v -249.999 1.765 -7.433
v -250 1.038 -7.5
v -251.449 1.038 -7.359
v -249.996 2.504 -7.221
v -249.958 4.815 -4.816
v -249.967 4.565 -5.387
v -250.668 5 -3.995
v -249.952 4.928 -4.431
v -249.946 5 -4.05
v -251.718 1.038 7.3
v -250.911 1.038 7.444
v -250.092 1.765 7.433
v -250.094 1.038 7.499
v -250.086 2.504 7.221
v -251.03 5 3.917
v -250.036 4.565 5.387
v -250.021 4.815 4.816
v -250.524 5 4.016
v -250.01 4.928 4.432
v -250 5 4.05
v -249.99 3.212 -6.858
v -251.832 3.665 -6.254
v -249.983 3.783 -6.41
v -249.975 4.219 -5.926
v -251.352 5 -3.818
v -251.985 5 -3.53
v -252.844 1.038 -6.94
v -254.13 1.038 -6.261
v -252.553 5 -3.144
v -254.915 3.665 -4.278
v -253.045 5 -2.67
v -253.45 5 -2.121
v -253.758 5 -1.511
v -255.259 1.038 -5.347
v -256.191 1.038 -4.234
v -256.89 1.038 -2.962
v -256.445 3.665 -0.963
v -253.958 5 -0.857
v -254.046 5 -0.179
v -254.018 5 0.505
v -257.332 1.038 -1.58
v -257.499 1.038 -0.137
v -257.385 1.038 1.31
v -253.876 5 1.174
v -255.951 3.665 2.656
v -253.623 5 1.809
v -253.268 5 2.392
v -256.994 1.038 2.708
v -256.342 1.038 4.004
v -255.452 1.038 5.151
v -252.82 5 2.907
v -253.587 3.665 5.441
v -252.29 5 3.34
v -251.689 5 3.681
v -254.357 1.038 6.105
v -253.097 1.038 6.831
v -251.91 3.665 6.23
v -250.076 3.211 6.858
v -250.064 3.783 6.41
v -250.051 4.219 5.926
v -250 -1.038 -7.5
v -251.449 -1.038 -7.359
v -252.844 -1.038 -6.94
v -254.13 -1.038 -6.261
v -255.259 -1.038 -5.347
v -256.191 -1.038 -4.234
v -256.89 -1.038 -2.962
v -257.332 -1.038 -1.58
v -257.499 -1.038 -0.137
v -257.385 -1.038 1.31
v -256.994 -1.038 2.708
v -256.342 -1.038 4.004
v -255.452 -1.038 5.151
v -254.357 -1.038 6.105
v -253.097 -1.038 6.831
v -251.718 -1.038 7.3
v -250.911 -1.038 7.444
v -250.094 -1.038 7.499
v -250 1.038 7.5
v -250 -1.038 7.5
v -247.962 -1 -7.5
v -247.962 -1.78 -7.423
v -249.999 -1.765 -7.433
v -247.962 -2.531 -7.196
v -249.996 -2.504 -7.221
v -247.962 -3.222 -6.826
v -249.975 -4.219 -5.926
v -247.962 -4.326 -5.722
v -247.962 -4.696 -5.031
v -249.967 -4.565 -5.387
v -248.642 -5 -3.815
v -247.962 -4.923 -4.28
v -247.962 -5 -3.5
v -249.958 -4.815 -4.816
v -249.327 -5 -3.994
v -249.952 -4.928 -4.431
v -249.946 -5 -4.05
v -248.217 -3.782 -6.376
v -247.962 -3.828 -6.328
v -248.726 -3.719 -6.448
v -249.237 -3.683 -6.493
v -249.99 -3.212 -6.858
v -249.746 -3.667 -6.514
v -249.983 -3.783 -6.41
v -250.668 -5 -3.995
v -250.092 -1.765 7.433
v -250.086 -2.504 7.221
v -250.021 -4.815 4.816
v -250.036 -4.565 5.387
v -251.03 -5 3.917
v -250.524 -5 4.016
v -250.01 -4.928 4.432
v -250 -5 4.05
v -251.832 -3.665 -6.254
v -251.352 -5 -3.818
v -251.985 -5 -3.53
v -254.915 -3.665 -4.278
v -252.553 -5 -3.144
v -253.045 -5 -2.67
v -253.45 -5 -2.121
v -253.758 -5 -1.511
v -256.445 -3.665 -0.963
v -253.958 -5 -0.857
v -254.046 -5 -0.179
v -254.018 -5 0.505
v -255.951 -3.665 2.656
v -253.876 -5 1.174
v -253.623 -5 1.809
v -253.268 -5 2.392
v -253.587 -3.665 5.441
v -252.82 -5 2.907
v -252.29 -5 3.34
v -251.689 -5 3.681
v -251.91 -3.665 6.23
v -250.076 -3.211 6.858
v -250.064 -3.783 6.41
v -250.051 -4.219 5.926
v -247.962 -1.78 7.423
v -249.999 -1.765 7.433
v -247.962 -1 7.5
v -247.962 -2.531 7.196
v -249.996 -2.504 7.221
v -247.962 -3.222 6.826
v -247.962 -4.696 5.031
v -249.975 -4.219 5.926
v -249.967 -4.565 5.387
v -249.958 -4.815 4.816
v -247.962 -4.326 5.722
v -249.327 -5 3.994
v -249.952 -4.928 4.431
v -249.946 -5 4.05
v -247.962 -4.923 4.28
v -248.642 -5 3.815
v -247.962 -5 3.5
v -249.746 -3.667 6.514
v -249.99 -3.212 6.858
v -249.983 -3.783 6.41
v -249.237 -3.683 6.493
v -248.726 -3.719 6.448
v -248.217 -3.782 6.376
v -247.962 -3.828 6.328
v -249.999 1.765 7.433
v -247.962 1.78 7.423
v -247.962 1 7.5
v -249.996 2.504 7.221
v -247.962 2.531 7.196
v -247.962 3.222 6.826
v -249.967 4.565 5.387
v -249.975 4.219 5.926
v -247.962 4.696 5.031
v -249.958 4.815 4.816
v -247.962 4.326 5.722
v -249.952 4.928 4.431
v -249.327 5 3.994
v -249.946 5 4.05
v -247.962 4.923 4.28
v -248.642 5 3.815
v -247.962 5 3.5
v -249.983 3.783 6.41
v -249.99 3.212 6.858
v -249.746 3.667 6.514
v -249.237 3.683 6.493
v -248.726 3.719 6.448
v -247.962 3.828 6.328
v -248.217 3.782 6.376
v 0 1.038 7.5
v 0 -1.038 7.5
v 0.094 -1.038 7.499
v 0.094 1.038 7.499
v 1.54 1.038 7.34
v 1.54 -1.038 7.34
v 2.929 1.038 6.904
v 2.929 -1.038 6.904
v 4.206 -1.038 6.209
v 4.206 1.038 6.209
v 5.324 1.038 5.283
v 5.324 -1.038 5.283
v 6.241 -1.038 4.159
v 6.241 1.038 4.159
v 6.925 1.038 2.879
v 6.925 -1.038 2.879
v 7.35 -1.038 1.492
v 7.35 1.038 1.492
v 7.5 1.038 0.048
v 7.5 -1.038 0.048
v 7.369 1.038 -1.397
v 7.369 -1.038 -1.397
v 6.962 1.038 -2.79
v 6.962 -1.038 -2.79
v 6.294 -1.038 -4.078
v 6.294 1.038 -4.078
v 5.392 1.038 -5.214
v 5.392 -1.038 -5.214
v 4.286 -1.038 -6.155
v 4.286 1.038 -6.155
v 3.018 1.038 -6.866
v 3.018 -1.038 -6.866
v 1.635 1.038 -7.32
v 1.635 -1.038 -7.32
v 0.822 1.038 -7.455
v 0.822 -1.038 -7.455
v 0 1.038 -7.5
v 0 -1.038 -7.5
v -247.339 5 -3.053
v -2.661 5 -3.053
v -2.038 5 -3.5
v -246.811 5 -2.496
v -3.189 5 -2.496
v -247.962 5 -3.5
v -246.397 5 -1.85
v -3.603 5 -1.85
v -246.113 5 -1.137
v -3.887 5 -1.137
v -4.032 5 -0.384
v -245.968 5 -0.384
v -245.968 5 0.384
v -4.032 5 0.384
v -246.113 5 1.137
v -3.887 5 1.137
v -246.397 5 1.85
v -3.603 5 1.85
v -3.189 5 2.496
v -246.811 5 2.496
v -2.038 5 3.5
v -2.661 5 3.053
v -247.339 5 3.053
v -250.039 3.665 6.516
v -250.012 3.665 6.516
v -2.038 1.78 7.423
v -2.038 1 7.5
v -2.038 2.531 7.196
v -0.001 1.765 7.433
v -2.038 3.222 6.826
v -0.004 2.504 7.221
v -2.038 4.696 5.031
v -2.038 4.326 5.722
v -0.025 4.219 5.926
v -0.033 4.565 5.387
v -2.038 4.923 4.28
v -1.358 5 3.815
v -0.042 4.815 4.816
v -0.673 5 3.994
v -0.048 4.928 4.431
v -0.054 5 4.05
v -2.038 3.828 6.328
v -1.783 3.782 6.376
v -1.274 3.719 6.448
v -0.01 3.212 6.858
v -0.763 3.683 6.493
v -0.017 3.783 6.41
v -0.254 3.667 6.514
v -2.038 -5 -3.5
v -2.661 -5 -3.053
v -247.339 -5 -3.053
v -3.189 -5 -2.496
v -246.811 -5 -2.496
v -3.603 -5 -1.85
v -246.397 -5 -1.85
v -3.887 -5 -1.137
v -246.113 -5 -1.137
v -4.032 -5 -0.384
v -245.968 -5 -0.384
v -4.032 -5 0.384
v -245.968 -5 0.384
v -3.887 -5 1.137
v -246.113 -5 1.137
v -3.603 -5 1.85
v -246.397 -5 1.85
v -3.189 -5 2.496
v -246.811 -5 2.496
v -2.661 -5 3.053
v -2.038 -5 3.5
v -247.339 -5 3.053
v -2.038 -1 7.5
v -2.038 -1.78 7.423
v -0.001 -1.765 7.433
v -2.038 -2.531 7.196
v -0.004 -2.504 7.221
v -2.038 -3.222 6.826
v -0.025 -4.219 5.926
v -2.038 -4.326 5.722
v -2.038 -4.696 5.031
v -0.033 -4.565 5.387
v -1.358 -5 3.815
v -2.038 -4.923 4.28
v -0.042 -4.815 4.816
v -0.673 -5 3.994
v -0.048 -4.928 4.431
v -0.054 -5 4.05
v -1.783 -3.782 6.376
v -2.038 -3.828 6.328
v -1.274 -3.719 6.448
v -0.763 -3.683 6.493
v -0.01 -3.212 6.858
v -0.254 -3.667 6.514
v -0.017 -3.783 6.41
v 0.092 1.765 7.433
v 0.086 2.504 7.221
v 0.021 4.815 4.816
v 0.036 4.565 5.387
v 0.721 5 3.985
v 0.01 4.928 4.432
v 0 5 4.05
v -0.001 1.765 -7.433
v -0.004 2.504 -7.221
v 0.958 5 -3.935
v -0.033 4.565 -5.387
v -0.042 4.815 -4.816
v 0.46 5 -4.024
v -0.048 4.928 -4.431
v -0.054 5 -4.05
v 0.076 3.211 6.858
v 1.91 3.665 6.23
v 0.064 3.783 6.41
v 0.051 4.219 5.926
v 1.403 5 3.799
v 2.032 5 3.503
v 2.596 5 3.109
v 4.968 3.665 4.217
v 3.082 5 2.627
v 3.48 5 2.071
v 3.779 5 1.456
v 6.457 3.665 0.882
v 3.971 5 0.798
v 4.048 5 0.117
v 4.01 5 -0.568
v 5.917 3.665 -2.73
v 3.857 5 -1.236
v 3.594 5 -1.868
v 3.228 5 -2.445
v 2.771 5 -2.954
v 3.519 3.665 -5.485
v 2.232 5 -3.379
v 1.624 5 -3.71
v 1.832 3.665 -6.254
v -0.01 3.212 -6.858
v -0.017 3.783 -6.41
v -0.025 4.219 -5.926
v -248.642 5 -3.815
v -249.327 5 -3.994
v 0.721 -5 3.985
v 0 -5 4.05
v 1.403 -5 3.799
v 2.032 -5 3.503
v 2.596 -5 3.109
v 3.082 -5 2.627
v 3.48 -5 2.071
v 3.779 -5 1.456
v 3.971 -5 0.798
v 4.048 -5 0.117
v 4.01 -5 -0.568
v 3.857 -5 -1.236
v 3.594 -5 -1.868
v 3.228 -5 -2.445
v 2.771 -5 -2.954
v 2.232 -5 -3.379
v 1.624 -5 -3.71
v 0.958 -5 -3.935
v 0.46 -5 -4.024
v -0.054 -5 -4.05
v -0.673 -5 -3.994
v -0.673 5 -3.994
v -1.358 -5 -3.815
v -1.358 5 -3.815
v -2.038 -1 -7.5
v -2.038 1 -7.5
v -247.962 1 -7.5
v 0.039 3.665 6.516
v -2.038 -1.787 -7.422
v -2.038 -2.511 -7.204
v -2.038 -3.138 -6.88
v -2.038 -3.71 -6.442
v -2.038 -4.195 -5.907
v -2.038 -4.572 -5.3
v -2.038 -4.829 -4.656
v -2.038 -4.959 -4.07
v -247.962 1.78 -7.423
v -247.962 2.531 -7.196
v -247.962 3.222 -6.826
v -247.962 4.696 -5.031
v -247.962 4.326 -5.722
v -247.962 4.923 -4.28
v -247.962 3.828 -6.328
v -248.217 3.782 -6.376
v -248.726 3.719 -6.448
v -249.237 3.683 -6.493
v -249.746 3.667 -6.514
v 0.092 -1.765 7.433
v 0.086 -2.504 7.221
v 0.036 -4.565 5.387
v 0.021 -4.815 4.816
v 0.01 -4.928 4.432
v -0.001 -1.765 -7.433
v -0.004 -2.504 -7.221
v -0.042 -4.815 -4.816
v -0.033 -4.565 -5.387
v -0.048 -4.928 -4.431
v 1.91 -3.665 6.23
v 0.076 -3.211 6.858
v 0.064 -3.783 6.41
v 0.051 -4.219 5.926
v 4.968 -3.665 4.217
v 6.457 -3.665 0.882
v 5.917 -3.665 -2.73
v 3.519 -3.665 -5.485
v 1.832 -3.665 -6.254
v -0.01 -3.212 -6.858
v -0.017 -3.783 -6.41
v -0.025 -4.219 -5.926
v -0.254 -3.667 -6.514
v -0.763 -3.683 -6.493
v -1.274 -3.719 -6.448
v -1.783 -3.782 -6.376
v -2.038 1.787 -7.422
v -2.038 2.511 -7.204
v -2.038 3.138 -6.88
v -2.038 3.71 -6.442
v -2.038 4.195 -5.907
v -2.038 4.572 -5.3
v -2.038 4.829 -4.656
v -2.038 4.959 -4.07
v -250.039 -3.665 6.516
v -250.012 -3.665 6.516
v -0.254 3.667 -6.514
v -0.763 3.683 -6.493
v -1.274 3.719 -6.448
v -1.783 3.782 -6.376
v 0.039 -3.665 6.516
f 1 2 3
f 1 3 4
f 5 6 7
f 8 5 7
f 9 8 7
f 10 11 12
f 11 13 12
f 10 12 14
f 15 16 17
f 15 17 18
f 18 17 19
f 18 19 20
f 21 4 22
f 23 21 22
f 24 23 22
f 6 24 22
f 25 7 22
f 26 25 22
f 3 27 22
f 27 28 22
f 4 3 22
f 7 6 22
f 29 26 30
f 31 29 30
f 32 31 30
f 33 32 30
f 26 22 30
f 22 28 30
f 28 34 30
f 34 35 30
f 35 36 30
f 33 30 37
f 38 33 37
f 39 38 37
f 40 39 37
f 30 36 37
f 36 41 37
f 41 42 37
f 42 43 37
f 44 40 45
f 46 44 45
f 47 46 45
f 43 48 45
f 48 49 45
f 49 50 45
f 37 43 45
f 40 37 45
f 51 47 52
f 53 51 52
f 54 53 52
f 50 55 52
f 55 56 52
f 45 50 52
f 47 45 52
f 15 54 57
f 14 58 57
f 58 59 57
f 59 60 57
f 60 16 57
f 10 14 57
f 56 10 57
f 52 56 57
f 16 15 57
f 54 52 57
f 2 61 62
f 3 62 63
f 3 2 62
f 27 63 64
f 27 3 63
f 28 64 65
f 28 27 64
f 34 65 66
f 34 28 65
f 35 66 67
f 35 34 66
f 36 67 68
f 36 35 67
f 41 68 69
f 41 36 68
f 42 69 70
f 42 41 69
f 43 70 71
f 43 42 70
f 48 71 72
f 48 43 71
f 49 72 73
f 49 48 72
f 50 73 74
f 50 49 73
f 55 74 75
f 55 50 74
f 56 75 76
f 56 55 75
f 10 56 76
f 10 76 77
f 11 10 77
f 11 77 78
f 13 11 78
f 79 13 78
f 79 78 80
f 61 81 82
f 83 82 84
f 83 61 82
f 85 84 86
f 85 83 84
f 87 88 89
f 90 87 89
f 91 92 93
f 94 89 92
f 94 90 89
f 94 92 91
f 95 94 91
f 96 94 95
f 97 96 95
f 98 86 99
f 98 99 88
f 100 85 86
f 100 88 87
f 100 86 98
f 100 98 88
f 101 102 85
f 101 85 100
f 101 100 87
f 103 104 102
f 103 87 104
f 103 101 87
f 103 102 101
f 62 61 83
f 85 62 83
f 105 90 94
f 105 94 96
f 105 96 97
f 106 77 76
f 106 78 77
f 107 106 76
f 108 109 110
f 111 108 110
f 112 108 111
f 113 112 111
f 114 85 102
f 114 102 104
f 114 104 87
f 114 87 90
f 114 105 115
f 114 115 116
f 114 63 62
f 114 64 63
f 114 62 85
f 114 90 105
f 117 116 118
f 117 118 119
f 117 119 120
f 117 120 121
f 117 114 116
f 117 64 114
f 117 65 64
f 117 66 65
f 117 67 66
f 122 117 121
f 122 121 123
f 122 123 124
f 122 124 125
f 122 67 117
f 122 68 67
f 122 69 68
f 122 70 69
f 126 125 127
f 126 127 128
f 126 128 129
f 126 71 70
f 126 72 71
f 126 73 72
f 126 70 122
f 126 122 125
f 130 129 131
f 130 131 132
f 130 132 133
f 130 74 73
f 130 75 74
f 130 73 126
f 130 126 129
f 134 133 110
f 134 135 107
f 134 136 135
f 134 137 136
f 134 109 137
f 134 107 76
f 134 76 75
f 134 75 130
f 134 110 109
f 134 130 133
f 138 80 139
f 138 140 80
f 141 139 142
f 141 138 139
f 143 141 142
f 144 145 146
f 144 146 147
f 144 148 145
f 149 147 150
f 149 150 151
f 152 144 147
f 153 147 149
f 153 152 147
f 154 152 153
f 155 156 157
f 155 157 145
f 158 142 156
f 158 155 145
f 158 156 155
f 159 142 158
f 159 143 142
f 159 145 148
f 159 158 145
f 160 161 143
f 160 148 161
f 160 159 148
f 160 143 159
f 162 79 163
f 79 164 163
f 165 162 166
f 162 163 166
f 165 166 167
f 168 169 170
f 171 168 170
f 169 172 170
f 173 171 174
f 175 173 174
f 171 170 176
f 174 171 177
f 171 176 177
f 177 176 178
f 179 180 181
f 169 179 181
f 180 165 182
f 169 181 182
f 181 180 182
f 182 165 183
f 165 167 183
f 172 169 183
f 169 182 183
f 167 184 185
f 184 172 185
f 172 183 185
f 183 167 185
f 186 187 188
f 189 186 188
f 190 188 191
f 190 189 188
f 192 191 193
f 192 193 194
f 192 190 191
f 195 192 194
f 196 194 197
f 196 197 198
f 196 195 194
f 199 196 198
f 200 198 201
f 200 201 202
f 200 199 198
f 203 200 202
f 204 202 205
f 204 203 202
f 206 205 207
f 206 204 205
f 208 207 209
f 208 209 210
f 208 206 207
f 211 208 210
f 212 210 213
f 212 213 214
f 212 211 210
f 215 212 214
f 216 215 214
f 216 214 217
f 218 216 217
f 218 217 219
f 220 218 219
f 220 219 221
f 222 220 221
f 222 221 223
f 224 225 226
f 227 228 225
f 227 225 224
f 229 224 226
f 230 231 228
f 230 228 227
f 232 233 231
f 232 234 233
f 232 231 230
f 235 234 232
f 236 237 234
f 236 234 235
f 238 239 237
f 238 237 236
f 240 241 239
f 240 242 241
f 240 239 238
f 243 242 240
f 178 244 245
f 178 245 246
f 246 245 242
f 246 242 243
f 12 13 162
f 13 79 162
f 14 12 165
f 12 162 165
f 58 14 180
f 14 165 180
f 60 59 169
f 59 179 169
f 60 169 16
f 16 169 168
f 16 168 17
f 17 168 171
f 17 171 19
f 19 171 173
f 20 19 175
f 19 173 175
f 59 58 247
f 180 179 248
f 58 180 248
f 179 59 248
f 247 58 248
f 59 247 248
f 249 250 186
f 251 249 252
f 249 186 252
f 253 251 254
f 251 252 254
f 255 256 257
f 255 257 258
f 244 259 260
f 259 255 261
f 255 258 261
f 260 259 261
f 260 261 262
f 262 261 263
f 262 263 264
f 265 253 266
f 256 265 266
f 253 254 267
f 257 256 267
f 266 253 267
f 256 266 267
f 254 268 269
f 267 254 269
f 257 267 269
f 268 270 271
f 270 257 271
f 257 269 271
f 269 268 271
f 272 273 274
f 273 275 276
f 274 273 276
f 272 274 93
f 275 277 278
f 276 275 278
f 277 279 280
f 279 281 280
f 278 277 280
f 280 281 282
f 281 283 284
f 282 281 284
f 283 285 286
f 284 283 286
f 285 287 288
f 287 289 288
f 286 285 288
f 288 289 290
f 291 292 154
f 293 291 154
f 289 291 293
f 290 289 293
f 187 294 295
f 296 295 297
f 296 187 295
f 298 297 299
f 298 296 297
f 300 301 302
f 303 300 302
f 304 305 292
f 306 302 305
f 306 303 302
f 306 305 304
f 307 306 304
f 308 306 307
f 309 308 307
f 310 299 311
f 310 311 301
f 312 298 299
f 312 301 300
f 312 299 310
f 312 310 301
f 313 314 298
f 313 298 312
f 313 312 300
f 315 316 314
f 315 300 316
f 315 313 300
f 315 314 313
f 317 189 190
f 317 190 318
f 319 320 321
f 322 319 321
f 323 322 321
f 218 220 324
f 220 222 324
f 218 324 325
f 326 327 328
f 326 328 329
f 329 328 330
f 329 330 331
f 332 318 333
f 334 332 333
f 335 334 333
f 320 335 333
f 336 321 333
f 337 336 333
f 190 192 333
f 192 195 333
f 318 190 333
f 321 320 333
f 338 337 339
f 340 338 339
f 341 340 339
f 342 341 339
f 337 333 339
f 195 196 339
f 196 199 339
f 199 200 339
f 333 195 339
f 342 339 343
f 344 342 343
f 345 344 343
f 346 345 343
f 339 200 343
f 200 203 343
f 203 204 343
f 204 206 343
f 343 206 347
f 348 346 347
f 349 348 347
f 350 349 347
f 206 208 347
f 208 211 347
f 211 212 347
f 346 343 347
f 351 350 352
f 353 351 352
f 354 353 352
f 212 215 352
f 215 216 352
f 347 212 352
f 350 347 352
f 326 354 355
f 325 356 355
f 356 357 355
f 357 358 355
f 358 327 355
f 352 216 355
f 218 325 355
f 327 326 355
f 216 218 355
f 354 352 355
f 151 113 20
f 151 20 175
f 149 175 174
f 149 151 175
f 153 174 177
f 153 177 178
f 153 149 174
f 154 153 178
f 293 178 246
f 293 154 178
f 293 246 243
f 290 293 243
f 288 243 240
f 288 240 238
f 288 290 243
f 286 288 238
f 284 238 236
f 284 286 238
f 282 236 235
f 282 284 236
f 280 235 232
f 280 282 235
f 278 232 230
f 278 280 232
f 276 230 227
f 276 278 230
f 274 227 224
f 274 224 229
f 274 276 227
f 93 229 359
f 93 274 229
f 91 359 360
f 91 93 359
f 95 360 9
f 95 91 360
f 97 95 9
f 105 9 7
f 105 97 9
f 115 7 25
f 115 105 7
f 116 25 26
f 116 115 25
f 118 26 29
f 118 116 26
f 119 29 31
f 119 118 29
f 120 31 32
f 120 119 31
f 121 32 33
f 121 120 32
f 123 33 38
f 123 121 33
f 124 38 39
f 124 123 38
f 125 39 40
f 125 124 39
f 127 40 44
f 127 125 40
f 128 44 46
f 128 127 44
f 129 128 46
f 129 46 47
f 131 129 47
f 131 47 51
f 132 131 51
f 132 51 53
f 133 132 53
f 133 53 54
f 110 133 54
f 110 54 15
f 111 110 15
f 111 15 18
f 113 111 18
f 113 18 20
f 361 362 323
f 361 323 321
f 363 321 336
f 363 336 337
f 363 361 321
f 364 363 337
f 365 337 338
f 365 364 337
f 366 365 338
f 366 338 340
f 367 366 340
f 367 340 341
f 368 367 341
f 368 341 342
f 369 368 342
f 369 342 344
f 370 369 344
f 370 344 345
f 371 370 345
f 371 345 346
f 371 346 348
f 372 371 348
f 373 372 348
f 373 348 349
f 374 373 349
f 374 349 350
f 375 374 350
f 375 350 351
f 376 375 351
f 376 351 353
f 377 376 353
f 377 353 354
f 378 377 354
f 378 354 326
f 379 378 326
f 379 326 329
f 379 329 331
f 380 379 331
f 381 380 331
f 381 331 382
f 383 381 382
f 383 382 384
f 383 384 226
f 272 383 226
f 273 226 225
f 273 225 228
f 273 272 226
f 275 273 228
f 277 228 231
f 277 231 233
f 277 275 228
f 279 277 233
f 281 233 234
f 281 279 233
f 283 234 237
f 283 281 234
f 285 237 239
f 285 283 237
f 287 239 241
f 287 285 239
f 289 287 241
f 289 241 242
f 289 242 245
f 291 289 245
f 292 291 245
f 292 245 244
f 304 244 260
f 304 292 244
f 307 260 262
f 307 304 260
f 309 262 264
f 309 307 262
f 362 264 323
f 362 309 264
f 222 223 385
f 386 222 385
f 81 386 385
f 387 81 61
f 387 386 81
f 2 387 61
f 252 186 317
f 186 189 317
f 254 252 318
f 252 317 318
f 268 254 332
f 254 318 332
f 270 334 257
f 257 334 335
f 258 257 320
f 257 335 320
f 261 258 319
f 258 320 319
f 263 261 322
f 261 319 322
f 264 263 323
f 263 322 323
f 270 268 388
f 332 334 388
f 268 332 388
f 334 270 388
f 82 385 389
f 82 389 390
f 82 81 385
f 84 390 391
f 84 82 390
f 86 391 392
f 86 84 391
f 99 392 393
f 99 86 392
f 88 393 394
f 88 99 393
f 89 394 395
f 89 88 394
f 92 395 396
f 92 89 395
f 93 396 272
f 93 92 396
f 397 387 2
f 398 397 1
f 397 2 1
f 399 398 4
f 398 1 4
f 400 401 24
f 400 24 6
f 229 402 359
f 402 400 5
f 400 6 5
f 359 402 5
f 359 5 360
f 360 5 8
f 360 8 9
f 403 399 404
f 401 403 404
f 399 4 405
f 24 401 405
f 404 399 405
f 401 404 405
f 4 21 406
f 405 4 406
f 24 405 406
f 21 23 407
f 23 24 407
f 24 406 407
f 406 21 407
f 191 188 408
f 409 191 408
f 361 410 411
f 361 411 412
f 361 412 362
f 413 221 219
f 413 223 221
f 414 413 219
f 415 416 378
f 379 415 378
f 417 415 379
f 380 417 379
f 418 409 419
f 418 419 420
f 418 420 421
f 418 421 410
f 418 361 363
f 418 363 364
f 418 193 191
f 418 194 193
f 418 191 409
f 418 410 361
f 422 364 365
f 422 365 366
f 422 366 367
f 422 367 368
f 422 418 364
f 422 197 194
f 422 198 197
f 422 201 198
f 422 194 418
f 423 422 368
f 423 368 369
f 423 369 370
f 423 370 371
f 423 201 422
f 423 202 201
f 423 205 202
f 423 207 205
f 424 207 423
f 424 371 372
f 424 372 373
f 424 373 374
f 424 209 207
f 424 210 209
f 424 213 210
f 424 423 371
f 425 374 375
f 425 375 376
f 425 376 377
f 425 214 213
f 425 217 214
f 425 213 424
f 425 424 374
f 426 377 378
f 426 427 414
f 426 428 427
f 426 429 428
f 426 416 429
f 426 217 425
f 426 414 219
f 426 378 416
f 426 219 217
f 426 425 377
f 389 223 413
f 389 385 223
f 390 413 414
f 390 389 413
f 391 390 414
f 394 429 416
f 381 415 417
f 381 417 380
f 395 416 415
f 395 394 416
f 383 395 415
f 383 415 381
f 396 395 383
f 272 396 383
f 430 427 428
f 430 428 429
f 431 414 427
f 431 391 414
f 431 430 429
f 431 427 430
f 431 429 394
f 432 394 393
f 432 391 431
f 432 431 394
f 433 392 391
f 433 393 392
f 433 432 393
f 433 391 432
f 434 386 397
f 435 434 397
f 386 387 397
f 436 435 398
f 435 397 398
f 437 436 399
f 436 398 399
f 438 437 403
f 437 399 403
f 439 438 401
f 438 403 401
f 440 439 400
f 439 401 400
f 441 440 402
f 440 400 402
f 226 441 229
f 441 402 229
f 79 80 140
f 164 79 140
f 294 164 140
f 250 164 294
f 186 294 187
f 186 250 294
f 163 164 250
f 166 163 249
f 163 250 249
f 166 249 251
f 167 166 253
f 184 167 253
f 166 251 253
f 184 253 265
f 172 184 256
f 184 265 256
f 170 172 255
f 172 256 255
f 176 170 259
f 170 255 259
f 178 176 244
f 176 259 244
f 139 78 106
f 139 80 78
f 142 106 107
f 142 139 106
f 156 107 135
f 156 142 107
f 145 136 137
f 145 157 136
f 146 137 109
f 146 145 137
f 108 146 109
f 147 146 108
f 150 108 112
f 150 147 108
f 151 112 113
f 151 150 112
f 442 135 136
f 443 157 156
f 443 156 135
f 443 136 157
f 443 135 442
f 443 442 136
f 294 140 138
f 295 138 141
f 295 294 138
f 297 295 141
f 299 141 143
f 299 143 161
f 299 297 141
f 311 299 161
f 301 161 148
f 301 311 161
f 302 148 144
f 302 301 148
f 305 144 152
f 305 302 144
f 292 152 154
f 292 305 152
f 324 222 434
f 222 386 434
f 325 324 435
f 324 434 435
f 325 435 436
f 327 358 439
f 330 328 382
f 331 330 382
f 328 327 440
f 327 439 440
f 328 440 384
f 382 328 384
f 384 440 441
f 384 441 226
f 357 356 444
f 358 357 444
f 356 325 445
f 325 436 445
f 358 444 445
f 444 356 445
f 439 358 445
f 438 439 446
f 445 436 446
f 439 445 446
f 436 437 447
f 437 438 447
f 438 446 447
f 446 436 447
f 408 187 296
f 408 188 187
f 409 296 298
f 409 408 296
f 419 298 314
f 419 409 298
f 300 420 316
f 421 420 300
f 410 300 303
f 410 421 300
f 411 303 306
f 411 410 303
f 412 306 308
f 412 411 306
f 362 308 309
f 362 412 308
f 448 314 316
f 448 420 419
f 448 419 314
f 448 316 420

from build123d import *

# Parameters (mm, degrees)
CROQUIS1_R              = 4.05
SALIENTE_EXTRUIR1_DEPTH = 5
REDONDEO6_R             = 4


with BuildPart() as part:
    # Croquis1 → Saliente-Extruir1 (new, symmetric)
    with BuildSketch(Plane(origin=(0, 0, 0), x_dir=(-1, 0, 0), z_dir=(0, 1, 0))):
        with BuildLine():
            Line((0, -7.5), (250, -7.5))
            ThreePointArc((250, -7.5), (257.5, 0), (250, 7.5))
            Line((250, 7.5), (0, 7.5))
            ThreePointArc((0, 7.5), (-7.5, 0), (0, -7.5))
        make_face()
        with Locations(Location((0, 0, 0), (0, 0, 90))):
            Circle(CROQUIS1_R, mode=Mode.SUBTRACT)
        with Locations(Location((250, 0, 0), (0, 0, 90))):
            Circle(CROQUIS1_R, mode=Mode.SUBTRACT)
    extrude(amount=SALIENTE_EXTRUIR1_DEPTH, both=True)

    # Redondeo6
    redondeo6_edges = [part.edges().sort_by_distance(p)[0] for p in [
        (-125, 5, 7.5),
        (-125, -5, 7.5),
        (-125, 5, -7.5),
        (-125, -5, -7.5),
    ]]
    fillet(redondeo6_edges, radius=REDONDEO6_R)


solid = part.part
